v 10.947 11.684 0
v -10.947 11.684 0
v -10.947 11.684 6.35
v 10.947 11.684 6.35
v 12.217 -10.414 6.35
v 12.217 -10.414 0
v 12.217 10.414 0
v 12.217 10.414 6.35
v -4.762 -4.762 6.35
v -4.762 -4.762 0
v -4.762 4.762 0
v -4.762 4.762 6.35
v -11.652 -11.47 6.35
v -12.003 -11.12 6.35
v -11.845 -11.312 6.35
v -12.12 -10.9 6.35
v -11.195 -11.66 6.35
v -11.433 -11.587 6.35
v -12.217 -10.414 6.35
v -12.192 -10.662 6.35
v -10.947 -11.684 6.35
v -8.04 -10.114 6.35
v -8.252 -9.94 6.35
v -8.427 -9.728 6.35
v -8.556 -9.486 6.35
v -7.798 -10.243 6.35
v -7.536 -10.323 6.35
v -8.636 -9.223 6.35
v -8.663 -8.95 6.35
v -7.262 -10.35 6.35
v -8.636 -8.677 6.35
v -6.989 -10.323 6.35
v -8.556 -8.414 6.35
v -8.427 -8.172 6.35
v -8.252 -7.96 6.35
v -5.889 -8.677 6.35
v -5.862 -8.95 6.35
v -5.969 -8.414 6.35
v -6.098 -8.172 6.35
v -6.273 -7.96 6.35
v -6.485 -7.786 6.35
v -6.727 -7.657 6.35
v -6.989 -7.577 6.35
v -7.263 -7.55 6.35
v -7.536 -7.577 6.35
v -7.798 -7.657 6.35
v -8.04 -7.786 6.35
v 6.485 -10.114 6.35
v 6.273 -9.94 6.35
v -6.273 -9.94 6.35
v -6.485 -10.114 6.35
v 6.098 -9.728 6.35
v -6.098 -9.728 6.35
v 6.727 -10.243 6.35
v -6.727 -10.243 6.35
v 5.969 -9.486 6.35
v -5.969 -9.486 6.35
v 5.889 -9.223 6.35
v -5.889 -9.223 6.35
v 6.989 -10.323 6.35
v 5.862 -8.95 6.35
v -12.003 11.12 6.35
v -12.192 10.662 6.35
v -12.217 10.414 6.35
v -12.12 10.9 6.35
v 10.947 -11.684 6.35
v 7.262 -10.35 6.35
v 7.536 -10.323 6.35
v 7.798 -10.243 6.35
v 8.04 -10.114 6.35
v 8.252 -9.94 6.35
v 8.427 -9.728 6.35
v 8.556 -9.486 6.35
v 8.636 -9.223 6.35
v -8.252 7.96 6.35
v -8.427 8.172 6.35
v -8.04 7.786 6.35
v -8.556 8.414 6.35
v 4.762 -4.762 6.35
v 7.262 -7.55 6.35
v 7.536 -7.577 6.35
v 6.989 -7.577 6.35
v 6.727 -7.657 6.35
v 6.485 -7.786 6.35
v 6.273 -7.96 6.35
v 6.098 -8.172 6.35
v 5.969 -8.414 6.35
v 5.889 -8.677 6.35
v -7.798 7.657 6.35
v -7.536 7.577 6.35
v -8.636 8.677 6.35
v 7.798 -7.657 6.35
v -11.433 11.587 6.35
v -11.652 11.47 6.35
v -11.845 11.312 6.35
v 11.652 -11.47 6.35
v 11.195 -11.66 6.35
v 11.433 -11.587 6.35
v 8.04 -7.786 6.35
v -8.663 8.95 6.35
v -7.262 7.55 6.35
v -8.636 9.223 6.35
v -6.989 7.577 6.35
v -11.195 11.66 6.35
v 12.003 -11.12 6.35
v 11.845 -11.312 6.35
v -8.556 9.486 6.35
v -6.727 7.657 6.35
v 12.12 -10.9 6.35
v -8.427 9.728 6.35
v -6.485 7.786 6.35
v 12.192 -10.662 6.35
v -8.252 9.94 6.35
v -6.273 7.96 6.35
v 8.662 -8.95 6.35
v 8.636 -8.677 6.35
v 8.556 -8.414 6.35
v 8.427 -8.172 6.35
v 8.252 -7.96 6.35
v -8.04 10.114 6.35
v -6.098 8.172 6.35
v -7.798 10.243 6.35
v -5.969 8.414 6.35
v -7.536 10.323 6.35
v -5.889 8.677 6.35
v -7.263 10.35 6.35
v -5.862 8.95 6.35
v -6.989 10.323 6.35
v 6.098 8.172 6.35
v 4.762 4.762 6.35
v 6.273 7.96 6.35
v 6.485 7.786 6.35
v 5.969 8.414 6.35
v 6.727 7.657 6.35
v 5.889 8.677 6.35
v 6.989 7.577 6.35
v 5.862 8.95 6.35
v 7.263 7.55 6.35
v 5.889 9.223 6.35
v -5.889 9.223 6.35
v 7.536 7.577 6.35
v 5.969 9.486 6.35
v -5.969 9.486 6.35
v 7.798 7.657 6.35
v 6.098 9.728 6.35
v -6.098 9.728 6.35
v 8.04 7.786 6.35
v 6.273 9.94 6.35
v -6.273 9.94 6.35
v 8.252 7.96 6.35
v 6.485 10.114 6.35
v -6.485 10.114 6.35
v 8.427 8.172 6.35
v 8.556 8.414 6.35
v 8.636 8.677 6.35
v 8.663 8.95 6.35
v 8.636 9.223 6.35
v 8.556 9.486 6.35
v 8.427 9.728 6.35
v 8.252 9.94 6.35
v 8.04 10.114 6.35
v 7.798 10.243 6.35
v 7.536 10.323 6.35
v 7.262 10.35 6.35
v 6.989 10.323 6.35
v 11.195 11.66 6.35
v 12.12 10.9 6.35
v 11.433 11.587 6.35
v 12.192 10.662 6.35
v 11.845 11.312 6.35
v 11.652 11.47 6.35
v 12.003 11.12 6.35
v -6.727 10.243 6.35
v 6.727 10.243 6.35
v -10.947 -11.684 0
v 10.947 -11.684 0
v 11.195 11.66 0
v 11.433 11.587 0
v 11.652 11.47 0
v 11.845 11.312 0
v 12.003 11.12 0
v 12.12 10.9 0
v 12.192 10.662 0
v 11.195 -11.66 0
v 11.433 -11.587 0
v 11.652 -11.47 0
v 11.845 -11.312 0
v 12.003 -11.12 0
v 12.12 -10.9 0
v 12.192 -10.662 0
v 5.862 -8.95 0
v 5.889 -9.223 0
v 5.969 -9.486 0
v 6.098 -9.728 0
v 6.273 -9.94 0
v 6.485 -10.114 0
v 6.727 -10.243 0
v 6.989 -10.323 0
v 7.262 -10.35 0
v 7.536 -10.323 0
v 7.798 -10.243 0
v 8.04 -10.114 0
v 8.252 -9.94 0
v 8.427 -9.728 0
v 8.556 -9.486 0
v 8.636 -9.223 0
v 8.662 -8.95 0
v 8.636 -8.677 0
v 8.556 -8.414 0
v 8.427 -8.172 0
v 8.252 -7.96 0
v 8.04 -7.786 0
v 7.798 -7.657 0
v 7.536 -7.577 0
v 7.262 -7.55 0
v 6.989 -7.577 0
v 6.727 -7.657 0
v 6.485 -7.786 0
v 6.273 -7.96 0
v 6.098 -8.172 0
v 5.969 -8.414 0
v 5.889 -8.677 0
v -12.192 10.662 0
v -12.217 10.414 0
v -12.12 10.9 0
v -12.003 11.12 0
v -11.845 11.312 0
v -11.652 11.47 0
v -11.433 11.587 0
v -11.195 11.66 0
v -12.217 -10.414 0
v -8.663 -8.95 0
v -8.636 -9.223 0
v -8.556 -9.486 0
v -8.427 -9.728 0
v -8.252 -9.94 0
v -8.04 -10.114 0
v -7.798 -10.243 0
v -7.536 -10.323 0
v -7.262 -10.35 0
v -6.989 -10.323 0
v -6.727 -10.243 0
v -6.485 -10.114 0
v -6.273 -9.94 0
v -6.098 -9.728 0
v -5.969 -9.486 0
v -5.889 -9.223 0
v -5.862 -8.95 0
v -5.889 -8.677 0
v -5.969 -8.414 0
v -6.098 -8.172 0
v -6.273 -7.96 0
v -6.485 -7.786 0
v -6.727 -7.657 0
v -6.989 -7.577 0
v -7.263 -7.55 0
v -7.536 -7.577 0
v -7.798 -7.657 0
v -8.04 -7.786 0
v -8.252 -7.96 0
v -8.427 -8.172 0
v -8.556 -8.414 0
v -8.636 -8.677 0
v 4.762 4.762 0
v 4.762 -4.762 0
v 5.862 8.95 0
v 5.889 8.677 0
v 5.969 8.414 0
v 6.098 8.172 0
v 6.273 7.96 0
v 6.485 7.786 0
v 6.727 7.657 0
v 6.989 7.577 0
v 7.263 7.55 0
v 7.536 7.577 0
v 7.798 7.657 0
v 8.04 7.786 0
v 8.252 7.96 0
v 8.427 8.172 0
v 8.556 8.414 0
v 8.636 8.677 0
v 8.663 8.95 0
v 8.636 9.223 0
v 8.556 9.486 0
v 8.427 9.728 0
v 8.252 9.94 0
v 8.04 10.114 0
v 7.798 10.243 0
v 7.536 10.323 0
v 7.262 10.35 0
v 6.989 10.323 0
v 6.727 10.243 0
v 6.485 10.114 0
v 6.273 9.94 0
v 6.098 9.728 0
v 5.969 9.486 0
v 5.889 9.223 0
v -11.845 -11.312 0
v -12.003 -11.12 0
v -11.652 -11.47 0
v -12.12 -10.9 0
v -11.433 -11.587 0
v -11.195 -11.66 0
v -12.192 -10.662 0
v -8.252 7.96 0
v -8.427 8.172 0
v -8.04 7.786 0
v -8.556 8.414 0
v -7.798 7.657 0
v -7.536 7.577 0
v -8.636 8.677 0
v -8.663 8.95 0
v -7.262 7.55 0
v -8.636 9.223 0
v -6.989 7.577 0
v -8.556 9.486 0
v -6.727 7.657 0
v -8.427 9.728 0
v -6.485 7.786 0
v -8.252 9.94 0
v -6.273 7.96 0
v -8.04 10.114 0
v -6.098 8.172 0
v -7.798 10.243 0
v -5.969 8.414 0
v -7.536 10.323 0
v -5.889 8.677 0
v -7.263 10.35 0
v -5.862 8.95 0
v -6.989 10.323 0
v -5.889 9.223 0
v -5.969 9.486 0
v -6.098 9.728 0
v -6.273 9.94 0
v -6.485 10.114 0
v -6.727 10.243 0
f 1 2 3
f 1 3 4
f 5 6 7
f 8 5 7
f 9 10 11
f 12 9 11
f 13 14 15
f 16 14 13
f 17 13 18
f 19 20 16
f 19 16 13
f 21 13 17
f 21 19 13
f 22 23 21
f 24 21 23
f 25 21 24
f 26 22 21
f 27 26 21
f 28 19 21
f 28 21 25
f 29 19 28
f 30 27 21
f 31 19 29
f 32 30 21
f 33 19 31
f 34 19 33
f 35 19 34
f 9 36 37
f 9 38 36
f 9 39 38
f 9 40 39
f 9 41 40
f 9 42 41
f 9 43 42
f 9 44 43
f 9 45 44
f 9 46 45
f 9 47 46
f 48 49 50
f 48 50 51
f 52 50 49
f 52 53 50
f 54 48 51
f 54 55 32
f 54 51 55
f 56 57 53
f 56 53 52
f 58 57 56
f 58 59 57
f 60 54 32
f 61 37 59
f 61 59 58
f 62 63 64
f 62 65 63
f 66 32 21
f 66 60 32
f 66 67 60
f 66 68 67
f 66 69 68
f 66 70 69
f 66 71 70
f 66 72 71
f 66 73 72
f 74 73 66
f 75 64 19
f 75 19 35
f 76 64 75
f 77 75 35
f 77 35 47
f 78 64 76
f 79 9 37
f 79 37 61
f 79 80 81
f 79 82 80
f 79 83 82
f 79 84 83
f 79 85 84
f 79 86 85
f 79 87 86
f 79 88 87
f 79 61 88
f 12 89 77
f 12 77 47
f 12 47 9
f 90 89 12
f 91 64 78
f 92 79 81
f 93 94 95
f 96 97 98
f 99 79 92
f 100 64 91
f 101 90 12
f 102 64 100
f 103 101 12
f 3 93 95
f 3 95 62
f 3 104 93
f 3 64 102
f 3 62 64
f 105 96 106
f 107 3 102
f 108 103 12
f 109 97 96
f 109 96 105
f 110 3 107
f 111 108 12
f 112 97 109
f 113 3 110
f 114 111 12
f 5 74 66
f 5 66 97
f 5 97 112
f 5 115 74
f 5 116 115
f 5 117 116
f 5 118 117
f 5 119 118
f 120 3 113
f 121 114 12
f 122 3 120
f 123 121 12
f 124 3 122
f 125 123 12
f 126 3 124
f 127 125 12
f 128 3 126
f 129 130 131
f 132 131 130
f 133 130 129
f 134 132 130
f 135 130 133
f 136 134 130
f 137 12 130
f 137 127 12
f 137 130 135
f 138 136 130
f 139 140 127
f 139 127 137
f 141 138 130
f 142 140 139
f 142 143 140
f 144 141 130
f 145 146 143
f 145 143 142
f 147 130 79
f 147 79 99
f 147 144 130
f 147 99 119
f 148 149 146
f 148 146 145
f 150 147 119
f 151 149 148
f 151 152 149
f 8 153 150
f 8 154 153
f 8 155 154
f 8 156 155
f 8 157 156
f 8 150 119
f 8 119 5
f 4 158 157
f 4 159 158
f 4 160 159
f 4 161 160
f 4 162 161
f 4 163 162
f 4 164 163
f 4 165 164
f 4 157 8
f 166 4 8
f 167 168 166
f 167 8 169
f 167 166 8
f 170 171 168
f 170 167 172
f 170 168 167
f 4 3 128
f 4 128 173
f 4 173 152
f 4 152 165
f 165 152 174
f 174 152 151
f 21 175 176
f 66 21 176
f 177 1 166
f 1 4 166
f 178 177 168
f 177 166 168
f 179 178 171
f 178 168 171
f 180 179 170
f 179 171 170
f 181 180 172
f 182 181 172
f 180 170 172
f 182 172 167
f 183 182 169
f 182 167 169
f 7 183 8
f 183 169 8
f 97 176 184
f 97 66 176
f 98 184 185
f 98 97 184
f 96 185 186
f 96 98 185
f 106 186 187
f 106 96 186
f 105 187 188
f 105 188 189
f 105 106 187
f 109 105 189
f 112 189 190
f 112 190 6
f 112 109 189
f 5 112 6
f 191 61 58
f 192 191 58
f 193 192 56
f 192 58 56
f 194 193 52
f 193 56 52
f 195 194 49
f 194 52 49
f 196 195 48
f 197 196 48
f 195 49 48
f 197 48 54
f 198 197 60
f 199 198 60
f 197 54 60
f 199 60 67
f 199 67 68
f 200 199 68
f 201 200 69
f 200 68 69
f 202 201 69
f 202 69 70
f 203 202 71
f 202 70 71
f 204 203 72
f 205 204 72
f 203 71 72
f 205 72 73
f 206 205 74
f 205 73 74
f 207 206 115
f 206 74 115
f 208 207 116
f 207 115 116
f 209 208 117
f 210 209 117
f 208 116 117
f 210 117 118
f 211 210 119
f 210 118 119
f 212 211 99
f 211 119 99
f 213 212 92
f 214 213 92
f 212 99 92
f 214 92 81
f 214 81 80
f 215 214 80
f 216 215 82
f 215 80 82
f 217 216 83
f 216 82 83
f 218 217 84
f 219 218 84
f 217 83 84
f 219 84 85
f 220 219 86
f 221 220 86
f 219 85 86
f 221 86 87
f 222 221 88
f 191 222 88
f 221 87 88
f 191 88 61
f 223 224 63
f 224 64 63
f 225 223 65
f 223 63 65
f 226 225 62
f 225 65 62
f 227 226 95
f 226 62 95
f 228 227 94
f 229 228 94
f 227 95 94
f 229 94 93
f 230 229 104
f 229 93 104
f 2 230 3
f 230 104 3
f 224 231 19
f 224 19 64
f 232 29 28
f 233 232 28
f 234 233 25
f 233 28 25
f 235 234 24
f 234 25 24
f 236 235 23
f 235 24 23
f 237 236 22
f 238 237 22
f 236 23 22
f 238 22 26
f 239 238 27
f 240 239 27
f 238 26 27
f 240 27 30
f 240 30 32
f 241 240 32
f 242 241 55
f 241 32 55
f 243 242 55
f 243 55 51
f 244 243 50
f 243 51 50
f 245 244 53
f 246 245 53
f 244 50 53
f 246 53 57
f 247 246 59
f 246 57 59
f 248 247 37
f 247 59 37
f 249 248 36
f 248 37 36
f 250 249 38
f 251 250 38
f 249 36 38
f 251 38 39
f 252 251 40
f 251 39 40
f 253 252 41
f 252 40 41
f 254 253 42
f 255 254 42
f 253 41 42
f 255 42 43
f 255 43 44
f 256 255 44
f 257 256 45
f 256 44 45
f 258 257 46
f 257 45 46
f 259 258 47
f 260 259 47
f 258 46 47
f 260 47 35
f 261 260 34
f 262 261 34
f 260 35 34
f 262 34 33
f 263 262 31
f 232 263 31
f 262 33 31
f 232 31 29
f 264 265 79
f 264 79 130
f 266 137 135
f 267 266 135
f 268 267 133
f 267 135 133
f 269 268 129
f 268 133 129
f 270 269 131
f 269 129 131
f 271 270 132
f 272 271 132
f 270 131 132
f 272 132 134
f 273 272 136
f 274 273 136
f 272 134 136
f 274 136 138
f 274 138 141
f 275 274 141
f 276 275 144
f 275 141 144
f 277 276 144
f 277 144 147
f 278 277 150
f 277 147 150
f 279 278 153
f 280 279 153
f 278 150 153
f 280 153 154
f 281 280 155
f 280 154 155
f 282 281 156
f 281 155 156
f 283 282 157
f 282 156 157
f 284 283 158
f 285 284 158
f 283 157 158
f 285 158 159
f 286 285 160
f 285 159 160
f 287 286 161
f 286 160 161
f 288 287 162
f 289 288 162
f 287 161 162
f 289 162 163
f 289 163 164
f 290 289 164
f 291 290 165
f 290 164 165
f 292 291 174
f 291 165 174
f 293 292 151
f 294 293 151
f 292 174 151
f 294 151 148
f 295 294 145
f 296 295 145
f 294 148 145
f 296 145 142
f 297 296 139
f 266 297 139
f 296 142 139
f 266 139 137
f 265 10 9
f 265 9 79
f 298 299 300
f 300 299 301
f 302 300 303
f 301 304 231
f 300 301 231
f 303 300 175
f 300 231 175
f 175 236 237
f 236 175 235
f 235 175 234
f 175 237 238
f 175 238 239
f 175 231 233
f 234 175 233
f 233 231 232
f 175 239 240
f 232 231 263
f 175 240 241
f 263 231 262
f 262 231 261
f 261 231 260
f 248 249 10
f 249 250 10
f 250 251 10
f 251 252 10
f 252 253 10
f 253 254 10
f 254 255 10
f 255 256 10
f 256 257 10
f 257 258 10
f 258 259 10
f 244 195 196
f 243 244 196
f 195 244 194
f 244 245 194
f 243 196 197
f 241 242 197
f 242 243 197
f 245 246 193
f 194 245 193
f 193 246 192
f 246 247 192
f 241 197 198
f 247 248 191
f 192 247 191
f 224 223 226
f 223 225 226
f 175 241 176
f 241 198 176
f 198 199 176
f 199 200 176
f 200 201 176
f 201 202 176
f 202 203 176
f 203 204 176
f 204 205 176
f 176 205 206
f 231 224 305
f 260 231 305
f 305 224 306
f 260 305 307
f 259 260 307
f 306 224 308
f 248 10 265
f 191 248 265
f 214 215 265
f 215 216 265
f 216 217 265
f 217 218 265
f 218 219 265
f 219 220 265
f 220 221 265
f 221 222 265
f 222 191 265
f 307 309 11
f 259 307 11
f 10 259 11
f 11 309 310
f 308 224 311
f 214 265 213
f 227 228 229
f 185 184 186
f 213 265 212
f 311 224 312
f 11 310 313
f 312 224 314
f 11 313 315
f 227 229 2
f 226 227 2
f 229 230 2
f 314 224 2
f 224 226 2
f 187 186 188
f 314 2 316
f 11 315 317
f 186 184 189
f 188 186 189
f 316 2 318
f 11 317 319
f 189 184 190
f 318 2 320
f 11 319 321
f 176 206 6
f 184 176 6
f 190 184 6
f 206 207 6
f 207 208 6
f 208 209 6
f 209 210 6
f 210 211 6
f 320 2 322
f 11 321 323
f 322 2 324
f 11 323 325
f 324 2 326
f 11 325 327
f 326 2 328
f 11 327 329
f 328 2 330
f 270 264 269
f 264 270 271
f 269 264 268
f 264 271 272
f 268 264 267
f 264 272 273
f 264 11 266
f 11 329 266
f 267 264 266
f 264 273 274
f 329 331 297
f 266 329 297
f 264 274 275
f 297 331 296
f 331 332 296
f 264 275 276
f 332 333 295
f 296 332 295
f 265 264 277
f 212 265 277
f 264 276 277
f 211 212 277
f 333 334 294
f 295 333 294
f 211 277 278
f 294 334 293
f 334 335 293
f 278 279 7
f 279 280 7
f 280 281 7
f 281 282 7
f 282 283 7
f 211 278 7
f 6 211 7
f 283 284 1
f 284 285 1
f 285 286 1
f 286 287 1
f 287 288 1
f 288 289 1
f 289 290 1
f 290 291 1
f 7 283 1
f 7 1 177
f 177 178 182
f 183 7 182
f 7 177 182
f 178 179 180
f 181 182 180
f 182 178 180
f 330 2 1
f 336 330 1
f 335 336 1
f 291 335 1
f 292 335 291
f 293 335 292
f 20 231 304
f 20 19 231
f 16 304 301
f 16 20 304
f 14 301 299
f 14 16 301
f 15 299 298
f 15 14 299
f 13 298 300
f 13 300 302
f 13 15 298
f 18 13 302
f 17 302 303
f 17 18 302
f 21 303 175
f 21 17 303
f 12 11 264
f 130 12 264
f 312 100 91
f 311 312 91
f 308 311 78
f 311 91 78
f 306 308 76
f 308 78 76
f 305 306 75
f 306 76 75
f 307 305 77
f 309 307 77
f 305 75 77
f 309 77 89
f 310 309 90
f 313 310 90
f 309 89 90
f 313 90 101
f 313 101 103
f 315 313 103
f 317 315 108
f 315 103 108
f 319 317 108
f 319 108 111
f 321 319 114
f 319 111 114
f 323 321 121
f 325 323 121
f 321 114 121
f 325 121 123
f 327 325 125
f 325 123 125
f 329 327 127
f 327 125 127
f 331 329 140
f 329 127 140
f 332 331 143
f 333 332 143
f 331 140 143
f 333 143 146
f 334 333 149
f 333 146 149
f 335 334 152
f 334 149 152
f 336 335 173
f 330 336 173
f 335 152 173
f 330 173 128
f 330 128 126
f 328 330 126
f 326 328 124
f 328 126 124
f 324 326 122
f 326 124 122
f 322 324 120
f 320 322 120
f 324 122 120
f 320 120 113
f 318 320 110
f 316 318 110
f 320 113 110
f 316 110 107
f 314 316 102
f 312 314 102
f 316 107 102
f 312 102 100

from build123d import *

# Parameters (mm, degrees)
F0_W     = 24.4336966982
F0_H     = 23.368
F0_W_2   = 9.525
F0_H_2   = 9.525
F1_DEPTH = 6.35
F3_R     = 1.27
F4_DEPTH = 6.35


with BuildPart() as f1:
    # F0 (on Top) → F1 (new body)
    with BuildSketch(Plane.XY):
        Rectangle(F0_W, F0_H)
        Rectangle(F0_W_2, F0_H_2, mode=Mode.SUBTRACT)
    extrude(amount=F1_DEPTH)

    # F3
    f3_edges = [f1.edges().sort_by_distance(p)[0] for p in [
        (12.216848, 11.684, 3.175),
        (-12.216848, 11.684, 3.175),
        (-12.216848, -11.684, 3.175),
        (12.216848, -11.684, 3.175),
    ]]
    fillet(f3_edges, radius=F3_R)

    # F2 (on face) → F4 (cut)
    with BuildSketch(Plane.XY.offset(6.35)):
        with BuildLine():
            Line((-8.6625, 8.95), (-5.8625, 8.95))
            ThreePointArc((-5.8625, 8.95), (-7.2625, 10.35), (-8.6625, 8.95))
        make_face()
        with BuildLine():
            ThreePointArc((-8.6625, 8.95), (-7.2625, 7.55), (-5.8625, 8.95))
            Line((-5.8625, 8.95), (-8.6625, 8.95))
        make_face()
        with BuildLine():
            Line((5.8625, 8.95), (8.6625, 8.95))
            ThreePointArc((8.6625, 8.95), (7.2625, 10.35), (5.8625, 8.95))
        make_face()
        with BuildLine():
            ThreePointArc((5.8625, 8.95), (7.2625, 7.55), (8.6625, 8.95))
            Line((8.6625, 8.95), (5.8625, 8.95))
        make_face()
        with BuildLine():
            Line((5.8625, -8.95), (8.6625, -8.95))
            ThreePointArc((8.6625, -8.95), (7.2625, -7.55), (5.8625, -8.95))
        make_face()
        with BuildLine():
            ThreePointArc((5.8625, -8.95), (7.2625, -10.35), (8.6625, -8.95))
            Line((8.6625, -8.95), (5.8625, -8.95))
        make_face()
        with BuildLine():
            Line((-8.6625, -8.95), (-5.8625, -8.95))
            ThreePointArc((-5.8625, -8.95), (-7.2625, -7.55), (-8.6625, -8.95))
        make_face()
        with BuildLine():
            ThreePointArc((-8.6625, -8.95), (-7.2625, -10.35), (-5.8625, -8.95))
            Line((-5.8625, -8.95), (-8.6625, -8.95))
        make_face()
    extrude(amount=-F4_DEPTH, mode=Mode.SUBTRACT)


solid = f1.part
